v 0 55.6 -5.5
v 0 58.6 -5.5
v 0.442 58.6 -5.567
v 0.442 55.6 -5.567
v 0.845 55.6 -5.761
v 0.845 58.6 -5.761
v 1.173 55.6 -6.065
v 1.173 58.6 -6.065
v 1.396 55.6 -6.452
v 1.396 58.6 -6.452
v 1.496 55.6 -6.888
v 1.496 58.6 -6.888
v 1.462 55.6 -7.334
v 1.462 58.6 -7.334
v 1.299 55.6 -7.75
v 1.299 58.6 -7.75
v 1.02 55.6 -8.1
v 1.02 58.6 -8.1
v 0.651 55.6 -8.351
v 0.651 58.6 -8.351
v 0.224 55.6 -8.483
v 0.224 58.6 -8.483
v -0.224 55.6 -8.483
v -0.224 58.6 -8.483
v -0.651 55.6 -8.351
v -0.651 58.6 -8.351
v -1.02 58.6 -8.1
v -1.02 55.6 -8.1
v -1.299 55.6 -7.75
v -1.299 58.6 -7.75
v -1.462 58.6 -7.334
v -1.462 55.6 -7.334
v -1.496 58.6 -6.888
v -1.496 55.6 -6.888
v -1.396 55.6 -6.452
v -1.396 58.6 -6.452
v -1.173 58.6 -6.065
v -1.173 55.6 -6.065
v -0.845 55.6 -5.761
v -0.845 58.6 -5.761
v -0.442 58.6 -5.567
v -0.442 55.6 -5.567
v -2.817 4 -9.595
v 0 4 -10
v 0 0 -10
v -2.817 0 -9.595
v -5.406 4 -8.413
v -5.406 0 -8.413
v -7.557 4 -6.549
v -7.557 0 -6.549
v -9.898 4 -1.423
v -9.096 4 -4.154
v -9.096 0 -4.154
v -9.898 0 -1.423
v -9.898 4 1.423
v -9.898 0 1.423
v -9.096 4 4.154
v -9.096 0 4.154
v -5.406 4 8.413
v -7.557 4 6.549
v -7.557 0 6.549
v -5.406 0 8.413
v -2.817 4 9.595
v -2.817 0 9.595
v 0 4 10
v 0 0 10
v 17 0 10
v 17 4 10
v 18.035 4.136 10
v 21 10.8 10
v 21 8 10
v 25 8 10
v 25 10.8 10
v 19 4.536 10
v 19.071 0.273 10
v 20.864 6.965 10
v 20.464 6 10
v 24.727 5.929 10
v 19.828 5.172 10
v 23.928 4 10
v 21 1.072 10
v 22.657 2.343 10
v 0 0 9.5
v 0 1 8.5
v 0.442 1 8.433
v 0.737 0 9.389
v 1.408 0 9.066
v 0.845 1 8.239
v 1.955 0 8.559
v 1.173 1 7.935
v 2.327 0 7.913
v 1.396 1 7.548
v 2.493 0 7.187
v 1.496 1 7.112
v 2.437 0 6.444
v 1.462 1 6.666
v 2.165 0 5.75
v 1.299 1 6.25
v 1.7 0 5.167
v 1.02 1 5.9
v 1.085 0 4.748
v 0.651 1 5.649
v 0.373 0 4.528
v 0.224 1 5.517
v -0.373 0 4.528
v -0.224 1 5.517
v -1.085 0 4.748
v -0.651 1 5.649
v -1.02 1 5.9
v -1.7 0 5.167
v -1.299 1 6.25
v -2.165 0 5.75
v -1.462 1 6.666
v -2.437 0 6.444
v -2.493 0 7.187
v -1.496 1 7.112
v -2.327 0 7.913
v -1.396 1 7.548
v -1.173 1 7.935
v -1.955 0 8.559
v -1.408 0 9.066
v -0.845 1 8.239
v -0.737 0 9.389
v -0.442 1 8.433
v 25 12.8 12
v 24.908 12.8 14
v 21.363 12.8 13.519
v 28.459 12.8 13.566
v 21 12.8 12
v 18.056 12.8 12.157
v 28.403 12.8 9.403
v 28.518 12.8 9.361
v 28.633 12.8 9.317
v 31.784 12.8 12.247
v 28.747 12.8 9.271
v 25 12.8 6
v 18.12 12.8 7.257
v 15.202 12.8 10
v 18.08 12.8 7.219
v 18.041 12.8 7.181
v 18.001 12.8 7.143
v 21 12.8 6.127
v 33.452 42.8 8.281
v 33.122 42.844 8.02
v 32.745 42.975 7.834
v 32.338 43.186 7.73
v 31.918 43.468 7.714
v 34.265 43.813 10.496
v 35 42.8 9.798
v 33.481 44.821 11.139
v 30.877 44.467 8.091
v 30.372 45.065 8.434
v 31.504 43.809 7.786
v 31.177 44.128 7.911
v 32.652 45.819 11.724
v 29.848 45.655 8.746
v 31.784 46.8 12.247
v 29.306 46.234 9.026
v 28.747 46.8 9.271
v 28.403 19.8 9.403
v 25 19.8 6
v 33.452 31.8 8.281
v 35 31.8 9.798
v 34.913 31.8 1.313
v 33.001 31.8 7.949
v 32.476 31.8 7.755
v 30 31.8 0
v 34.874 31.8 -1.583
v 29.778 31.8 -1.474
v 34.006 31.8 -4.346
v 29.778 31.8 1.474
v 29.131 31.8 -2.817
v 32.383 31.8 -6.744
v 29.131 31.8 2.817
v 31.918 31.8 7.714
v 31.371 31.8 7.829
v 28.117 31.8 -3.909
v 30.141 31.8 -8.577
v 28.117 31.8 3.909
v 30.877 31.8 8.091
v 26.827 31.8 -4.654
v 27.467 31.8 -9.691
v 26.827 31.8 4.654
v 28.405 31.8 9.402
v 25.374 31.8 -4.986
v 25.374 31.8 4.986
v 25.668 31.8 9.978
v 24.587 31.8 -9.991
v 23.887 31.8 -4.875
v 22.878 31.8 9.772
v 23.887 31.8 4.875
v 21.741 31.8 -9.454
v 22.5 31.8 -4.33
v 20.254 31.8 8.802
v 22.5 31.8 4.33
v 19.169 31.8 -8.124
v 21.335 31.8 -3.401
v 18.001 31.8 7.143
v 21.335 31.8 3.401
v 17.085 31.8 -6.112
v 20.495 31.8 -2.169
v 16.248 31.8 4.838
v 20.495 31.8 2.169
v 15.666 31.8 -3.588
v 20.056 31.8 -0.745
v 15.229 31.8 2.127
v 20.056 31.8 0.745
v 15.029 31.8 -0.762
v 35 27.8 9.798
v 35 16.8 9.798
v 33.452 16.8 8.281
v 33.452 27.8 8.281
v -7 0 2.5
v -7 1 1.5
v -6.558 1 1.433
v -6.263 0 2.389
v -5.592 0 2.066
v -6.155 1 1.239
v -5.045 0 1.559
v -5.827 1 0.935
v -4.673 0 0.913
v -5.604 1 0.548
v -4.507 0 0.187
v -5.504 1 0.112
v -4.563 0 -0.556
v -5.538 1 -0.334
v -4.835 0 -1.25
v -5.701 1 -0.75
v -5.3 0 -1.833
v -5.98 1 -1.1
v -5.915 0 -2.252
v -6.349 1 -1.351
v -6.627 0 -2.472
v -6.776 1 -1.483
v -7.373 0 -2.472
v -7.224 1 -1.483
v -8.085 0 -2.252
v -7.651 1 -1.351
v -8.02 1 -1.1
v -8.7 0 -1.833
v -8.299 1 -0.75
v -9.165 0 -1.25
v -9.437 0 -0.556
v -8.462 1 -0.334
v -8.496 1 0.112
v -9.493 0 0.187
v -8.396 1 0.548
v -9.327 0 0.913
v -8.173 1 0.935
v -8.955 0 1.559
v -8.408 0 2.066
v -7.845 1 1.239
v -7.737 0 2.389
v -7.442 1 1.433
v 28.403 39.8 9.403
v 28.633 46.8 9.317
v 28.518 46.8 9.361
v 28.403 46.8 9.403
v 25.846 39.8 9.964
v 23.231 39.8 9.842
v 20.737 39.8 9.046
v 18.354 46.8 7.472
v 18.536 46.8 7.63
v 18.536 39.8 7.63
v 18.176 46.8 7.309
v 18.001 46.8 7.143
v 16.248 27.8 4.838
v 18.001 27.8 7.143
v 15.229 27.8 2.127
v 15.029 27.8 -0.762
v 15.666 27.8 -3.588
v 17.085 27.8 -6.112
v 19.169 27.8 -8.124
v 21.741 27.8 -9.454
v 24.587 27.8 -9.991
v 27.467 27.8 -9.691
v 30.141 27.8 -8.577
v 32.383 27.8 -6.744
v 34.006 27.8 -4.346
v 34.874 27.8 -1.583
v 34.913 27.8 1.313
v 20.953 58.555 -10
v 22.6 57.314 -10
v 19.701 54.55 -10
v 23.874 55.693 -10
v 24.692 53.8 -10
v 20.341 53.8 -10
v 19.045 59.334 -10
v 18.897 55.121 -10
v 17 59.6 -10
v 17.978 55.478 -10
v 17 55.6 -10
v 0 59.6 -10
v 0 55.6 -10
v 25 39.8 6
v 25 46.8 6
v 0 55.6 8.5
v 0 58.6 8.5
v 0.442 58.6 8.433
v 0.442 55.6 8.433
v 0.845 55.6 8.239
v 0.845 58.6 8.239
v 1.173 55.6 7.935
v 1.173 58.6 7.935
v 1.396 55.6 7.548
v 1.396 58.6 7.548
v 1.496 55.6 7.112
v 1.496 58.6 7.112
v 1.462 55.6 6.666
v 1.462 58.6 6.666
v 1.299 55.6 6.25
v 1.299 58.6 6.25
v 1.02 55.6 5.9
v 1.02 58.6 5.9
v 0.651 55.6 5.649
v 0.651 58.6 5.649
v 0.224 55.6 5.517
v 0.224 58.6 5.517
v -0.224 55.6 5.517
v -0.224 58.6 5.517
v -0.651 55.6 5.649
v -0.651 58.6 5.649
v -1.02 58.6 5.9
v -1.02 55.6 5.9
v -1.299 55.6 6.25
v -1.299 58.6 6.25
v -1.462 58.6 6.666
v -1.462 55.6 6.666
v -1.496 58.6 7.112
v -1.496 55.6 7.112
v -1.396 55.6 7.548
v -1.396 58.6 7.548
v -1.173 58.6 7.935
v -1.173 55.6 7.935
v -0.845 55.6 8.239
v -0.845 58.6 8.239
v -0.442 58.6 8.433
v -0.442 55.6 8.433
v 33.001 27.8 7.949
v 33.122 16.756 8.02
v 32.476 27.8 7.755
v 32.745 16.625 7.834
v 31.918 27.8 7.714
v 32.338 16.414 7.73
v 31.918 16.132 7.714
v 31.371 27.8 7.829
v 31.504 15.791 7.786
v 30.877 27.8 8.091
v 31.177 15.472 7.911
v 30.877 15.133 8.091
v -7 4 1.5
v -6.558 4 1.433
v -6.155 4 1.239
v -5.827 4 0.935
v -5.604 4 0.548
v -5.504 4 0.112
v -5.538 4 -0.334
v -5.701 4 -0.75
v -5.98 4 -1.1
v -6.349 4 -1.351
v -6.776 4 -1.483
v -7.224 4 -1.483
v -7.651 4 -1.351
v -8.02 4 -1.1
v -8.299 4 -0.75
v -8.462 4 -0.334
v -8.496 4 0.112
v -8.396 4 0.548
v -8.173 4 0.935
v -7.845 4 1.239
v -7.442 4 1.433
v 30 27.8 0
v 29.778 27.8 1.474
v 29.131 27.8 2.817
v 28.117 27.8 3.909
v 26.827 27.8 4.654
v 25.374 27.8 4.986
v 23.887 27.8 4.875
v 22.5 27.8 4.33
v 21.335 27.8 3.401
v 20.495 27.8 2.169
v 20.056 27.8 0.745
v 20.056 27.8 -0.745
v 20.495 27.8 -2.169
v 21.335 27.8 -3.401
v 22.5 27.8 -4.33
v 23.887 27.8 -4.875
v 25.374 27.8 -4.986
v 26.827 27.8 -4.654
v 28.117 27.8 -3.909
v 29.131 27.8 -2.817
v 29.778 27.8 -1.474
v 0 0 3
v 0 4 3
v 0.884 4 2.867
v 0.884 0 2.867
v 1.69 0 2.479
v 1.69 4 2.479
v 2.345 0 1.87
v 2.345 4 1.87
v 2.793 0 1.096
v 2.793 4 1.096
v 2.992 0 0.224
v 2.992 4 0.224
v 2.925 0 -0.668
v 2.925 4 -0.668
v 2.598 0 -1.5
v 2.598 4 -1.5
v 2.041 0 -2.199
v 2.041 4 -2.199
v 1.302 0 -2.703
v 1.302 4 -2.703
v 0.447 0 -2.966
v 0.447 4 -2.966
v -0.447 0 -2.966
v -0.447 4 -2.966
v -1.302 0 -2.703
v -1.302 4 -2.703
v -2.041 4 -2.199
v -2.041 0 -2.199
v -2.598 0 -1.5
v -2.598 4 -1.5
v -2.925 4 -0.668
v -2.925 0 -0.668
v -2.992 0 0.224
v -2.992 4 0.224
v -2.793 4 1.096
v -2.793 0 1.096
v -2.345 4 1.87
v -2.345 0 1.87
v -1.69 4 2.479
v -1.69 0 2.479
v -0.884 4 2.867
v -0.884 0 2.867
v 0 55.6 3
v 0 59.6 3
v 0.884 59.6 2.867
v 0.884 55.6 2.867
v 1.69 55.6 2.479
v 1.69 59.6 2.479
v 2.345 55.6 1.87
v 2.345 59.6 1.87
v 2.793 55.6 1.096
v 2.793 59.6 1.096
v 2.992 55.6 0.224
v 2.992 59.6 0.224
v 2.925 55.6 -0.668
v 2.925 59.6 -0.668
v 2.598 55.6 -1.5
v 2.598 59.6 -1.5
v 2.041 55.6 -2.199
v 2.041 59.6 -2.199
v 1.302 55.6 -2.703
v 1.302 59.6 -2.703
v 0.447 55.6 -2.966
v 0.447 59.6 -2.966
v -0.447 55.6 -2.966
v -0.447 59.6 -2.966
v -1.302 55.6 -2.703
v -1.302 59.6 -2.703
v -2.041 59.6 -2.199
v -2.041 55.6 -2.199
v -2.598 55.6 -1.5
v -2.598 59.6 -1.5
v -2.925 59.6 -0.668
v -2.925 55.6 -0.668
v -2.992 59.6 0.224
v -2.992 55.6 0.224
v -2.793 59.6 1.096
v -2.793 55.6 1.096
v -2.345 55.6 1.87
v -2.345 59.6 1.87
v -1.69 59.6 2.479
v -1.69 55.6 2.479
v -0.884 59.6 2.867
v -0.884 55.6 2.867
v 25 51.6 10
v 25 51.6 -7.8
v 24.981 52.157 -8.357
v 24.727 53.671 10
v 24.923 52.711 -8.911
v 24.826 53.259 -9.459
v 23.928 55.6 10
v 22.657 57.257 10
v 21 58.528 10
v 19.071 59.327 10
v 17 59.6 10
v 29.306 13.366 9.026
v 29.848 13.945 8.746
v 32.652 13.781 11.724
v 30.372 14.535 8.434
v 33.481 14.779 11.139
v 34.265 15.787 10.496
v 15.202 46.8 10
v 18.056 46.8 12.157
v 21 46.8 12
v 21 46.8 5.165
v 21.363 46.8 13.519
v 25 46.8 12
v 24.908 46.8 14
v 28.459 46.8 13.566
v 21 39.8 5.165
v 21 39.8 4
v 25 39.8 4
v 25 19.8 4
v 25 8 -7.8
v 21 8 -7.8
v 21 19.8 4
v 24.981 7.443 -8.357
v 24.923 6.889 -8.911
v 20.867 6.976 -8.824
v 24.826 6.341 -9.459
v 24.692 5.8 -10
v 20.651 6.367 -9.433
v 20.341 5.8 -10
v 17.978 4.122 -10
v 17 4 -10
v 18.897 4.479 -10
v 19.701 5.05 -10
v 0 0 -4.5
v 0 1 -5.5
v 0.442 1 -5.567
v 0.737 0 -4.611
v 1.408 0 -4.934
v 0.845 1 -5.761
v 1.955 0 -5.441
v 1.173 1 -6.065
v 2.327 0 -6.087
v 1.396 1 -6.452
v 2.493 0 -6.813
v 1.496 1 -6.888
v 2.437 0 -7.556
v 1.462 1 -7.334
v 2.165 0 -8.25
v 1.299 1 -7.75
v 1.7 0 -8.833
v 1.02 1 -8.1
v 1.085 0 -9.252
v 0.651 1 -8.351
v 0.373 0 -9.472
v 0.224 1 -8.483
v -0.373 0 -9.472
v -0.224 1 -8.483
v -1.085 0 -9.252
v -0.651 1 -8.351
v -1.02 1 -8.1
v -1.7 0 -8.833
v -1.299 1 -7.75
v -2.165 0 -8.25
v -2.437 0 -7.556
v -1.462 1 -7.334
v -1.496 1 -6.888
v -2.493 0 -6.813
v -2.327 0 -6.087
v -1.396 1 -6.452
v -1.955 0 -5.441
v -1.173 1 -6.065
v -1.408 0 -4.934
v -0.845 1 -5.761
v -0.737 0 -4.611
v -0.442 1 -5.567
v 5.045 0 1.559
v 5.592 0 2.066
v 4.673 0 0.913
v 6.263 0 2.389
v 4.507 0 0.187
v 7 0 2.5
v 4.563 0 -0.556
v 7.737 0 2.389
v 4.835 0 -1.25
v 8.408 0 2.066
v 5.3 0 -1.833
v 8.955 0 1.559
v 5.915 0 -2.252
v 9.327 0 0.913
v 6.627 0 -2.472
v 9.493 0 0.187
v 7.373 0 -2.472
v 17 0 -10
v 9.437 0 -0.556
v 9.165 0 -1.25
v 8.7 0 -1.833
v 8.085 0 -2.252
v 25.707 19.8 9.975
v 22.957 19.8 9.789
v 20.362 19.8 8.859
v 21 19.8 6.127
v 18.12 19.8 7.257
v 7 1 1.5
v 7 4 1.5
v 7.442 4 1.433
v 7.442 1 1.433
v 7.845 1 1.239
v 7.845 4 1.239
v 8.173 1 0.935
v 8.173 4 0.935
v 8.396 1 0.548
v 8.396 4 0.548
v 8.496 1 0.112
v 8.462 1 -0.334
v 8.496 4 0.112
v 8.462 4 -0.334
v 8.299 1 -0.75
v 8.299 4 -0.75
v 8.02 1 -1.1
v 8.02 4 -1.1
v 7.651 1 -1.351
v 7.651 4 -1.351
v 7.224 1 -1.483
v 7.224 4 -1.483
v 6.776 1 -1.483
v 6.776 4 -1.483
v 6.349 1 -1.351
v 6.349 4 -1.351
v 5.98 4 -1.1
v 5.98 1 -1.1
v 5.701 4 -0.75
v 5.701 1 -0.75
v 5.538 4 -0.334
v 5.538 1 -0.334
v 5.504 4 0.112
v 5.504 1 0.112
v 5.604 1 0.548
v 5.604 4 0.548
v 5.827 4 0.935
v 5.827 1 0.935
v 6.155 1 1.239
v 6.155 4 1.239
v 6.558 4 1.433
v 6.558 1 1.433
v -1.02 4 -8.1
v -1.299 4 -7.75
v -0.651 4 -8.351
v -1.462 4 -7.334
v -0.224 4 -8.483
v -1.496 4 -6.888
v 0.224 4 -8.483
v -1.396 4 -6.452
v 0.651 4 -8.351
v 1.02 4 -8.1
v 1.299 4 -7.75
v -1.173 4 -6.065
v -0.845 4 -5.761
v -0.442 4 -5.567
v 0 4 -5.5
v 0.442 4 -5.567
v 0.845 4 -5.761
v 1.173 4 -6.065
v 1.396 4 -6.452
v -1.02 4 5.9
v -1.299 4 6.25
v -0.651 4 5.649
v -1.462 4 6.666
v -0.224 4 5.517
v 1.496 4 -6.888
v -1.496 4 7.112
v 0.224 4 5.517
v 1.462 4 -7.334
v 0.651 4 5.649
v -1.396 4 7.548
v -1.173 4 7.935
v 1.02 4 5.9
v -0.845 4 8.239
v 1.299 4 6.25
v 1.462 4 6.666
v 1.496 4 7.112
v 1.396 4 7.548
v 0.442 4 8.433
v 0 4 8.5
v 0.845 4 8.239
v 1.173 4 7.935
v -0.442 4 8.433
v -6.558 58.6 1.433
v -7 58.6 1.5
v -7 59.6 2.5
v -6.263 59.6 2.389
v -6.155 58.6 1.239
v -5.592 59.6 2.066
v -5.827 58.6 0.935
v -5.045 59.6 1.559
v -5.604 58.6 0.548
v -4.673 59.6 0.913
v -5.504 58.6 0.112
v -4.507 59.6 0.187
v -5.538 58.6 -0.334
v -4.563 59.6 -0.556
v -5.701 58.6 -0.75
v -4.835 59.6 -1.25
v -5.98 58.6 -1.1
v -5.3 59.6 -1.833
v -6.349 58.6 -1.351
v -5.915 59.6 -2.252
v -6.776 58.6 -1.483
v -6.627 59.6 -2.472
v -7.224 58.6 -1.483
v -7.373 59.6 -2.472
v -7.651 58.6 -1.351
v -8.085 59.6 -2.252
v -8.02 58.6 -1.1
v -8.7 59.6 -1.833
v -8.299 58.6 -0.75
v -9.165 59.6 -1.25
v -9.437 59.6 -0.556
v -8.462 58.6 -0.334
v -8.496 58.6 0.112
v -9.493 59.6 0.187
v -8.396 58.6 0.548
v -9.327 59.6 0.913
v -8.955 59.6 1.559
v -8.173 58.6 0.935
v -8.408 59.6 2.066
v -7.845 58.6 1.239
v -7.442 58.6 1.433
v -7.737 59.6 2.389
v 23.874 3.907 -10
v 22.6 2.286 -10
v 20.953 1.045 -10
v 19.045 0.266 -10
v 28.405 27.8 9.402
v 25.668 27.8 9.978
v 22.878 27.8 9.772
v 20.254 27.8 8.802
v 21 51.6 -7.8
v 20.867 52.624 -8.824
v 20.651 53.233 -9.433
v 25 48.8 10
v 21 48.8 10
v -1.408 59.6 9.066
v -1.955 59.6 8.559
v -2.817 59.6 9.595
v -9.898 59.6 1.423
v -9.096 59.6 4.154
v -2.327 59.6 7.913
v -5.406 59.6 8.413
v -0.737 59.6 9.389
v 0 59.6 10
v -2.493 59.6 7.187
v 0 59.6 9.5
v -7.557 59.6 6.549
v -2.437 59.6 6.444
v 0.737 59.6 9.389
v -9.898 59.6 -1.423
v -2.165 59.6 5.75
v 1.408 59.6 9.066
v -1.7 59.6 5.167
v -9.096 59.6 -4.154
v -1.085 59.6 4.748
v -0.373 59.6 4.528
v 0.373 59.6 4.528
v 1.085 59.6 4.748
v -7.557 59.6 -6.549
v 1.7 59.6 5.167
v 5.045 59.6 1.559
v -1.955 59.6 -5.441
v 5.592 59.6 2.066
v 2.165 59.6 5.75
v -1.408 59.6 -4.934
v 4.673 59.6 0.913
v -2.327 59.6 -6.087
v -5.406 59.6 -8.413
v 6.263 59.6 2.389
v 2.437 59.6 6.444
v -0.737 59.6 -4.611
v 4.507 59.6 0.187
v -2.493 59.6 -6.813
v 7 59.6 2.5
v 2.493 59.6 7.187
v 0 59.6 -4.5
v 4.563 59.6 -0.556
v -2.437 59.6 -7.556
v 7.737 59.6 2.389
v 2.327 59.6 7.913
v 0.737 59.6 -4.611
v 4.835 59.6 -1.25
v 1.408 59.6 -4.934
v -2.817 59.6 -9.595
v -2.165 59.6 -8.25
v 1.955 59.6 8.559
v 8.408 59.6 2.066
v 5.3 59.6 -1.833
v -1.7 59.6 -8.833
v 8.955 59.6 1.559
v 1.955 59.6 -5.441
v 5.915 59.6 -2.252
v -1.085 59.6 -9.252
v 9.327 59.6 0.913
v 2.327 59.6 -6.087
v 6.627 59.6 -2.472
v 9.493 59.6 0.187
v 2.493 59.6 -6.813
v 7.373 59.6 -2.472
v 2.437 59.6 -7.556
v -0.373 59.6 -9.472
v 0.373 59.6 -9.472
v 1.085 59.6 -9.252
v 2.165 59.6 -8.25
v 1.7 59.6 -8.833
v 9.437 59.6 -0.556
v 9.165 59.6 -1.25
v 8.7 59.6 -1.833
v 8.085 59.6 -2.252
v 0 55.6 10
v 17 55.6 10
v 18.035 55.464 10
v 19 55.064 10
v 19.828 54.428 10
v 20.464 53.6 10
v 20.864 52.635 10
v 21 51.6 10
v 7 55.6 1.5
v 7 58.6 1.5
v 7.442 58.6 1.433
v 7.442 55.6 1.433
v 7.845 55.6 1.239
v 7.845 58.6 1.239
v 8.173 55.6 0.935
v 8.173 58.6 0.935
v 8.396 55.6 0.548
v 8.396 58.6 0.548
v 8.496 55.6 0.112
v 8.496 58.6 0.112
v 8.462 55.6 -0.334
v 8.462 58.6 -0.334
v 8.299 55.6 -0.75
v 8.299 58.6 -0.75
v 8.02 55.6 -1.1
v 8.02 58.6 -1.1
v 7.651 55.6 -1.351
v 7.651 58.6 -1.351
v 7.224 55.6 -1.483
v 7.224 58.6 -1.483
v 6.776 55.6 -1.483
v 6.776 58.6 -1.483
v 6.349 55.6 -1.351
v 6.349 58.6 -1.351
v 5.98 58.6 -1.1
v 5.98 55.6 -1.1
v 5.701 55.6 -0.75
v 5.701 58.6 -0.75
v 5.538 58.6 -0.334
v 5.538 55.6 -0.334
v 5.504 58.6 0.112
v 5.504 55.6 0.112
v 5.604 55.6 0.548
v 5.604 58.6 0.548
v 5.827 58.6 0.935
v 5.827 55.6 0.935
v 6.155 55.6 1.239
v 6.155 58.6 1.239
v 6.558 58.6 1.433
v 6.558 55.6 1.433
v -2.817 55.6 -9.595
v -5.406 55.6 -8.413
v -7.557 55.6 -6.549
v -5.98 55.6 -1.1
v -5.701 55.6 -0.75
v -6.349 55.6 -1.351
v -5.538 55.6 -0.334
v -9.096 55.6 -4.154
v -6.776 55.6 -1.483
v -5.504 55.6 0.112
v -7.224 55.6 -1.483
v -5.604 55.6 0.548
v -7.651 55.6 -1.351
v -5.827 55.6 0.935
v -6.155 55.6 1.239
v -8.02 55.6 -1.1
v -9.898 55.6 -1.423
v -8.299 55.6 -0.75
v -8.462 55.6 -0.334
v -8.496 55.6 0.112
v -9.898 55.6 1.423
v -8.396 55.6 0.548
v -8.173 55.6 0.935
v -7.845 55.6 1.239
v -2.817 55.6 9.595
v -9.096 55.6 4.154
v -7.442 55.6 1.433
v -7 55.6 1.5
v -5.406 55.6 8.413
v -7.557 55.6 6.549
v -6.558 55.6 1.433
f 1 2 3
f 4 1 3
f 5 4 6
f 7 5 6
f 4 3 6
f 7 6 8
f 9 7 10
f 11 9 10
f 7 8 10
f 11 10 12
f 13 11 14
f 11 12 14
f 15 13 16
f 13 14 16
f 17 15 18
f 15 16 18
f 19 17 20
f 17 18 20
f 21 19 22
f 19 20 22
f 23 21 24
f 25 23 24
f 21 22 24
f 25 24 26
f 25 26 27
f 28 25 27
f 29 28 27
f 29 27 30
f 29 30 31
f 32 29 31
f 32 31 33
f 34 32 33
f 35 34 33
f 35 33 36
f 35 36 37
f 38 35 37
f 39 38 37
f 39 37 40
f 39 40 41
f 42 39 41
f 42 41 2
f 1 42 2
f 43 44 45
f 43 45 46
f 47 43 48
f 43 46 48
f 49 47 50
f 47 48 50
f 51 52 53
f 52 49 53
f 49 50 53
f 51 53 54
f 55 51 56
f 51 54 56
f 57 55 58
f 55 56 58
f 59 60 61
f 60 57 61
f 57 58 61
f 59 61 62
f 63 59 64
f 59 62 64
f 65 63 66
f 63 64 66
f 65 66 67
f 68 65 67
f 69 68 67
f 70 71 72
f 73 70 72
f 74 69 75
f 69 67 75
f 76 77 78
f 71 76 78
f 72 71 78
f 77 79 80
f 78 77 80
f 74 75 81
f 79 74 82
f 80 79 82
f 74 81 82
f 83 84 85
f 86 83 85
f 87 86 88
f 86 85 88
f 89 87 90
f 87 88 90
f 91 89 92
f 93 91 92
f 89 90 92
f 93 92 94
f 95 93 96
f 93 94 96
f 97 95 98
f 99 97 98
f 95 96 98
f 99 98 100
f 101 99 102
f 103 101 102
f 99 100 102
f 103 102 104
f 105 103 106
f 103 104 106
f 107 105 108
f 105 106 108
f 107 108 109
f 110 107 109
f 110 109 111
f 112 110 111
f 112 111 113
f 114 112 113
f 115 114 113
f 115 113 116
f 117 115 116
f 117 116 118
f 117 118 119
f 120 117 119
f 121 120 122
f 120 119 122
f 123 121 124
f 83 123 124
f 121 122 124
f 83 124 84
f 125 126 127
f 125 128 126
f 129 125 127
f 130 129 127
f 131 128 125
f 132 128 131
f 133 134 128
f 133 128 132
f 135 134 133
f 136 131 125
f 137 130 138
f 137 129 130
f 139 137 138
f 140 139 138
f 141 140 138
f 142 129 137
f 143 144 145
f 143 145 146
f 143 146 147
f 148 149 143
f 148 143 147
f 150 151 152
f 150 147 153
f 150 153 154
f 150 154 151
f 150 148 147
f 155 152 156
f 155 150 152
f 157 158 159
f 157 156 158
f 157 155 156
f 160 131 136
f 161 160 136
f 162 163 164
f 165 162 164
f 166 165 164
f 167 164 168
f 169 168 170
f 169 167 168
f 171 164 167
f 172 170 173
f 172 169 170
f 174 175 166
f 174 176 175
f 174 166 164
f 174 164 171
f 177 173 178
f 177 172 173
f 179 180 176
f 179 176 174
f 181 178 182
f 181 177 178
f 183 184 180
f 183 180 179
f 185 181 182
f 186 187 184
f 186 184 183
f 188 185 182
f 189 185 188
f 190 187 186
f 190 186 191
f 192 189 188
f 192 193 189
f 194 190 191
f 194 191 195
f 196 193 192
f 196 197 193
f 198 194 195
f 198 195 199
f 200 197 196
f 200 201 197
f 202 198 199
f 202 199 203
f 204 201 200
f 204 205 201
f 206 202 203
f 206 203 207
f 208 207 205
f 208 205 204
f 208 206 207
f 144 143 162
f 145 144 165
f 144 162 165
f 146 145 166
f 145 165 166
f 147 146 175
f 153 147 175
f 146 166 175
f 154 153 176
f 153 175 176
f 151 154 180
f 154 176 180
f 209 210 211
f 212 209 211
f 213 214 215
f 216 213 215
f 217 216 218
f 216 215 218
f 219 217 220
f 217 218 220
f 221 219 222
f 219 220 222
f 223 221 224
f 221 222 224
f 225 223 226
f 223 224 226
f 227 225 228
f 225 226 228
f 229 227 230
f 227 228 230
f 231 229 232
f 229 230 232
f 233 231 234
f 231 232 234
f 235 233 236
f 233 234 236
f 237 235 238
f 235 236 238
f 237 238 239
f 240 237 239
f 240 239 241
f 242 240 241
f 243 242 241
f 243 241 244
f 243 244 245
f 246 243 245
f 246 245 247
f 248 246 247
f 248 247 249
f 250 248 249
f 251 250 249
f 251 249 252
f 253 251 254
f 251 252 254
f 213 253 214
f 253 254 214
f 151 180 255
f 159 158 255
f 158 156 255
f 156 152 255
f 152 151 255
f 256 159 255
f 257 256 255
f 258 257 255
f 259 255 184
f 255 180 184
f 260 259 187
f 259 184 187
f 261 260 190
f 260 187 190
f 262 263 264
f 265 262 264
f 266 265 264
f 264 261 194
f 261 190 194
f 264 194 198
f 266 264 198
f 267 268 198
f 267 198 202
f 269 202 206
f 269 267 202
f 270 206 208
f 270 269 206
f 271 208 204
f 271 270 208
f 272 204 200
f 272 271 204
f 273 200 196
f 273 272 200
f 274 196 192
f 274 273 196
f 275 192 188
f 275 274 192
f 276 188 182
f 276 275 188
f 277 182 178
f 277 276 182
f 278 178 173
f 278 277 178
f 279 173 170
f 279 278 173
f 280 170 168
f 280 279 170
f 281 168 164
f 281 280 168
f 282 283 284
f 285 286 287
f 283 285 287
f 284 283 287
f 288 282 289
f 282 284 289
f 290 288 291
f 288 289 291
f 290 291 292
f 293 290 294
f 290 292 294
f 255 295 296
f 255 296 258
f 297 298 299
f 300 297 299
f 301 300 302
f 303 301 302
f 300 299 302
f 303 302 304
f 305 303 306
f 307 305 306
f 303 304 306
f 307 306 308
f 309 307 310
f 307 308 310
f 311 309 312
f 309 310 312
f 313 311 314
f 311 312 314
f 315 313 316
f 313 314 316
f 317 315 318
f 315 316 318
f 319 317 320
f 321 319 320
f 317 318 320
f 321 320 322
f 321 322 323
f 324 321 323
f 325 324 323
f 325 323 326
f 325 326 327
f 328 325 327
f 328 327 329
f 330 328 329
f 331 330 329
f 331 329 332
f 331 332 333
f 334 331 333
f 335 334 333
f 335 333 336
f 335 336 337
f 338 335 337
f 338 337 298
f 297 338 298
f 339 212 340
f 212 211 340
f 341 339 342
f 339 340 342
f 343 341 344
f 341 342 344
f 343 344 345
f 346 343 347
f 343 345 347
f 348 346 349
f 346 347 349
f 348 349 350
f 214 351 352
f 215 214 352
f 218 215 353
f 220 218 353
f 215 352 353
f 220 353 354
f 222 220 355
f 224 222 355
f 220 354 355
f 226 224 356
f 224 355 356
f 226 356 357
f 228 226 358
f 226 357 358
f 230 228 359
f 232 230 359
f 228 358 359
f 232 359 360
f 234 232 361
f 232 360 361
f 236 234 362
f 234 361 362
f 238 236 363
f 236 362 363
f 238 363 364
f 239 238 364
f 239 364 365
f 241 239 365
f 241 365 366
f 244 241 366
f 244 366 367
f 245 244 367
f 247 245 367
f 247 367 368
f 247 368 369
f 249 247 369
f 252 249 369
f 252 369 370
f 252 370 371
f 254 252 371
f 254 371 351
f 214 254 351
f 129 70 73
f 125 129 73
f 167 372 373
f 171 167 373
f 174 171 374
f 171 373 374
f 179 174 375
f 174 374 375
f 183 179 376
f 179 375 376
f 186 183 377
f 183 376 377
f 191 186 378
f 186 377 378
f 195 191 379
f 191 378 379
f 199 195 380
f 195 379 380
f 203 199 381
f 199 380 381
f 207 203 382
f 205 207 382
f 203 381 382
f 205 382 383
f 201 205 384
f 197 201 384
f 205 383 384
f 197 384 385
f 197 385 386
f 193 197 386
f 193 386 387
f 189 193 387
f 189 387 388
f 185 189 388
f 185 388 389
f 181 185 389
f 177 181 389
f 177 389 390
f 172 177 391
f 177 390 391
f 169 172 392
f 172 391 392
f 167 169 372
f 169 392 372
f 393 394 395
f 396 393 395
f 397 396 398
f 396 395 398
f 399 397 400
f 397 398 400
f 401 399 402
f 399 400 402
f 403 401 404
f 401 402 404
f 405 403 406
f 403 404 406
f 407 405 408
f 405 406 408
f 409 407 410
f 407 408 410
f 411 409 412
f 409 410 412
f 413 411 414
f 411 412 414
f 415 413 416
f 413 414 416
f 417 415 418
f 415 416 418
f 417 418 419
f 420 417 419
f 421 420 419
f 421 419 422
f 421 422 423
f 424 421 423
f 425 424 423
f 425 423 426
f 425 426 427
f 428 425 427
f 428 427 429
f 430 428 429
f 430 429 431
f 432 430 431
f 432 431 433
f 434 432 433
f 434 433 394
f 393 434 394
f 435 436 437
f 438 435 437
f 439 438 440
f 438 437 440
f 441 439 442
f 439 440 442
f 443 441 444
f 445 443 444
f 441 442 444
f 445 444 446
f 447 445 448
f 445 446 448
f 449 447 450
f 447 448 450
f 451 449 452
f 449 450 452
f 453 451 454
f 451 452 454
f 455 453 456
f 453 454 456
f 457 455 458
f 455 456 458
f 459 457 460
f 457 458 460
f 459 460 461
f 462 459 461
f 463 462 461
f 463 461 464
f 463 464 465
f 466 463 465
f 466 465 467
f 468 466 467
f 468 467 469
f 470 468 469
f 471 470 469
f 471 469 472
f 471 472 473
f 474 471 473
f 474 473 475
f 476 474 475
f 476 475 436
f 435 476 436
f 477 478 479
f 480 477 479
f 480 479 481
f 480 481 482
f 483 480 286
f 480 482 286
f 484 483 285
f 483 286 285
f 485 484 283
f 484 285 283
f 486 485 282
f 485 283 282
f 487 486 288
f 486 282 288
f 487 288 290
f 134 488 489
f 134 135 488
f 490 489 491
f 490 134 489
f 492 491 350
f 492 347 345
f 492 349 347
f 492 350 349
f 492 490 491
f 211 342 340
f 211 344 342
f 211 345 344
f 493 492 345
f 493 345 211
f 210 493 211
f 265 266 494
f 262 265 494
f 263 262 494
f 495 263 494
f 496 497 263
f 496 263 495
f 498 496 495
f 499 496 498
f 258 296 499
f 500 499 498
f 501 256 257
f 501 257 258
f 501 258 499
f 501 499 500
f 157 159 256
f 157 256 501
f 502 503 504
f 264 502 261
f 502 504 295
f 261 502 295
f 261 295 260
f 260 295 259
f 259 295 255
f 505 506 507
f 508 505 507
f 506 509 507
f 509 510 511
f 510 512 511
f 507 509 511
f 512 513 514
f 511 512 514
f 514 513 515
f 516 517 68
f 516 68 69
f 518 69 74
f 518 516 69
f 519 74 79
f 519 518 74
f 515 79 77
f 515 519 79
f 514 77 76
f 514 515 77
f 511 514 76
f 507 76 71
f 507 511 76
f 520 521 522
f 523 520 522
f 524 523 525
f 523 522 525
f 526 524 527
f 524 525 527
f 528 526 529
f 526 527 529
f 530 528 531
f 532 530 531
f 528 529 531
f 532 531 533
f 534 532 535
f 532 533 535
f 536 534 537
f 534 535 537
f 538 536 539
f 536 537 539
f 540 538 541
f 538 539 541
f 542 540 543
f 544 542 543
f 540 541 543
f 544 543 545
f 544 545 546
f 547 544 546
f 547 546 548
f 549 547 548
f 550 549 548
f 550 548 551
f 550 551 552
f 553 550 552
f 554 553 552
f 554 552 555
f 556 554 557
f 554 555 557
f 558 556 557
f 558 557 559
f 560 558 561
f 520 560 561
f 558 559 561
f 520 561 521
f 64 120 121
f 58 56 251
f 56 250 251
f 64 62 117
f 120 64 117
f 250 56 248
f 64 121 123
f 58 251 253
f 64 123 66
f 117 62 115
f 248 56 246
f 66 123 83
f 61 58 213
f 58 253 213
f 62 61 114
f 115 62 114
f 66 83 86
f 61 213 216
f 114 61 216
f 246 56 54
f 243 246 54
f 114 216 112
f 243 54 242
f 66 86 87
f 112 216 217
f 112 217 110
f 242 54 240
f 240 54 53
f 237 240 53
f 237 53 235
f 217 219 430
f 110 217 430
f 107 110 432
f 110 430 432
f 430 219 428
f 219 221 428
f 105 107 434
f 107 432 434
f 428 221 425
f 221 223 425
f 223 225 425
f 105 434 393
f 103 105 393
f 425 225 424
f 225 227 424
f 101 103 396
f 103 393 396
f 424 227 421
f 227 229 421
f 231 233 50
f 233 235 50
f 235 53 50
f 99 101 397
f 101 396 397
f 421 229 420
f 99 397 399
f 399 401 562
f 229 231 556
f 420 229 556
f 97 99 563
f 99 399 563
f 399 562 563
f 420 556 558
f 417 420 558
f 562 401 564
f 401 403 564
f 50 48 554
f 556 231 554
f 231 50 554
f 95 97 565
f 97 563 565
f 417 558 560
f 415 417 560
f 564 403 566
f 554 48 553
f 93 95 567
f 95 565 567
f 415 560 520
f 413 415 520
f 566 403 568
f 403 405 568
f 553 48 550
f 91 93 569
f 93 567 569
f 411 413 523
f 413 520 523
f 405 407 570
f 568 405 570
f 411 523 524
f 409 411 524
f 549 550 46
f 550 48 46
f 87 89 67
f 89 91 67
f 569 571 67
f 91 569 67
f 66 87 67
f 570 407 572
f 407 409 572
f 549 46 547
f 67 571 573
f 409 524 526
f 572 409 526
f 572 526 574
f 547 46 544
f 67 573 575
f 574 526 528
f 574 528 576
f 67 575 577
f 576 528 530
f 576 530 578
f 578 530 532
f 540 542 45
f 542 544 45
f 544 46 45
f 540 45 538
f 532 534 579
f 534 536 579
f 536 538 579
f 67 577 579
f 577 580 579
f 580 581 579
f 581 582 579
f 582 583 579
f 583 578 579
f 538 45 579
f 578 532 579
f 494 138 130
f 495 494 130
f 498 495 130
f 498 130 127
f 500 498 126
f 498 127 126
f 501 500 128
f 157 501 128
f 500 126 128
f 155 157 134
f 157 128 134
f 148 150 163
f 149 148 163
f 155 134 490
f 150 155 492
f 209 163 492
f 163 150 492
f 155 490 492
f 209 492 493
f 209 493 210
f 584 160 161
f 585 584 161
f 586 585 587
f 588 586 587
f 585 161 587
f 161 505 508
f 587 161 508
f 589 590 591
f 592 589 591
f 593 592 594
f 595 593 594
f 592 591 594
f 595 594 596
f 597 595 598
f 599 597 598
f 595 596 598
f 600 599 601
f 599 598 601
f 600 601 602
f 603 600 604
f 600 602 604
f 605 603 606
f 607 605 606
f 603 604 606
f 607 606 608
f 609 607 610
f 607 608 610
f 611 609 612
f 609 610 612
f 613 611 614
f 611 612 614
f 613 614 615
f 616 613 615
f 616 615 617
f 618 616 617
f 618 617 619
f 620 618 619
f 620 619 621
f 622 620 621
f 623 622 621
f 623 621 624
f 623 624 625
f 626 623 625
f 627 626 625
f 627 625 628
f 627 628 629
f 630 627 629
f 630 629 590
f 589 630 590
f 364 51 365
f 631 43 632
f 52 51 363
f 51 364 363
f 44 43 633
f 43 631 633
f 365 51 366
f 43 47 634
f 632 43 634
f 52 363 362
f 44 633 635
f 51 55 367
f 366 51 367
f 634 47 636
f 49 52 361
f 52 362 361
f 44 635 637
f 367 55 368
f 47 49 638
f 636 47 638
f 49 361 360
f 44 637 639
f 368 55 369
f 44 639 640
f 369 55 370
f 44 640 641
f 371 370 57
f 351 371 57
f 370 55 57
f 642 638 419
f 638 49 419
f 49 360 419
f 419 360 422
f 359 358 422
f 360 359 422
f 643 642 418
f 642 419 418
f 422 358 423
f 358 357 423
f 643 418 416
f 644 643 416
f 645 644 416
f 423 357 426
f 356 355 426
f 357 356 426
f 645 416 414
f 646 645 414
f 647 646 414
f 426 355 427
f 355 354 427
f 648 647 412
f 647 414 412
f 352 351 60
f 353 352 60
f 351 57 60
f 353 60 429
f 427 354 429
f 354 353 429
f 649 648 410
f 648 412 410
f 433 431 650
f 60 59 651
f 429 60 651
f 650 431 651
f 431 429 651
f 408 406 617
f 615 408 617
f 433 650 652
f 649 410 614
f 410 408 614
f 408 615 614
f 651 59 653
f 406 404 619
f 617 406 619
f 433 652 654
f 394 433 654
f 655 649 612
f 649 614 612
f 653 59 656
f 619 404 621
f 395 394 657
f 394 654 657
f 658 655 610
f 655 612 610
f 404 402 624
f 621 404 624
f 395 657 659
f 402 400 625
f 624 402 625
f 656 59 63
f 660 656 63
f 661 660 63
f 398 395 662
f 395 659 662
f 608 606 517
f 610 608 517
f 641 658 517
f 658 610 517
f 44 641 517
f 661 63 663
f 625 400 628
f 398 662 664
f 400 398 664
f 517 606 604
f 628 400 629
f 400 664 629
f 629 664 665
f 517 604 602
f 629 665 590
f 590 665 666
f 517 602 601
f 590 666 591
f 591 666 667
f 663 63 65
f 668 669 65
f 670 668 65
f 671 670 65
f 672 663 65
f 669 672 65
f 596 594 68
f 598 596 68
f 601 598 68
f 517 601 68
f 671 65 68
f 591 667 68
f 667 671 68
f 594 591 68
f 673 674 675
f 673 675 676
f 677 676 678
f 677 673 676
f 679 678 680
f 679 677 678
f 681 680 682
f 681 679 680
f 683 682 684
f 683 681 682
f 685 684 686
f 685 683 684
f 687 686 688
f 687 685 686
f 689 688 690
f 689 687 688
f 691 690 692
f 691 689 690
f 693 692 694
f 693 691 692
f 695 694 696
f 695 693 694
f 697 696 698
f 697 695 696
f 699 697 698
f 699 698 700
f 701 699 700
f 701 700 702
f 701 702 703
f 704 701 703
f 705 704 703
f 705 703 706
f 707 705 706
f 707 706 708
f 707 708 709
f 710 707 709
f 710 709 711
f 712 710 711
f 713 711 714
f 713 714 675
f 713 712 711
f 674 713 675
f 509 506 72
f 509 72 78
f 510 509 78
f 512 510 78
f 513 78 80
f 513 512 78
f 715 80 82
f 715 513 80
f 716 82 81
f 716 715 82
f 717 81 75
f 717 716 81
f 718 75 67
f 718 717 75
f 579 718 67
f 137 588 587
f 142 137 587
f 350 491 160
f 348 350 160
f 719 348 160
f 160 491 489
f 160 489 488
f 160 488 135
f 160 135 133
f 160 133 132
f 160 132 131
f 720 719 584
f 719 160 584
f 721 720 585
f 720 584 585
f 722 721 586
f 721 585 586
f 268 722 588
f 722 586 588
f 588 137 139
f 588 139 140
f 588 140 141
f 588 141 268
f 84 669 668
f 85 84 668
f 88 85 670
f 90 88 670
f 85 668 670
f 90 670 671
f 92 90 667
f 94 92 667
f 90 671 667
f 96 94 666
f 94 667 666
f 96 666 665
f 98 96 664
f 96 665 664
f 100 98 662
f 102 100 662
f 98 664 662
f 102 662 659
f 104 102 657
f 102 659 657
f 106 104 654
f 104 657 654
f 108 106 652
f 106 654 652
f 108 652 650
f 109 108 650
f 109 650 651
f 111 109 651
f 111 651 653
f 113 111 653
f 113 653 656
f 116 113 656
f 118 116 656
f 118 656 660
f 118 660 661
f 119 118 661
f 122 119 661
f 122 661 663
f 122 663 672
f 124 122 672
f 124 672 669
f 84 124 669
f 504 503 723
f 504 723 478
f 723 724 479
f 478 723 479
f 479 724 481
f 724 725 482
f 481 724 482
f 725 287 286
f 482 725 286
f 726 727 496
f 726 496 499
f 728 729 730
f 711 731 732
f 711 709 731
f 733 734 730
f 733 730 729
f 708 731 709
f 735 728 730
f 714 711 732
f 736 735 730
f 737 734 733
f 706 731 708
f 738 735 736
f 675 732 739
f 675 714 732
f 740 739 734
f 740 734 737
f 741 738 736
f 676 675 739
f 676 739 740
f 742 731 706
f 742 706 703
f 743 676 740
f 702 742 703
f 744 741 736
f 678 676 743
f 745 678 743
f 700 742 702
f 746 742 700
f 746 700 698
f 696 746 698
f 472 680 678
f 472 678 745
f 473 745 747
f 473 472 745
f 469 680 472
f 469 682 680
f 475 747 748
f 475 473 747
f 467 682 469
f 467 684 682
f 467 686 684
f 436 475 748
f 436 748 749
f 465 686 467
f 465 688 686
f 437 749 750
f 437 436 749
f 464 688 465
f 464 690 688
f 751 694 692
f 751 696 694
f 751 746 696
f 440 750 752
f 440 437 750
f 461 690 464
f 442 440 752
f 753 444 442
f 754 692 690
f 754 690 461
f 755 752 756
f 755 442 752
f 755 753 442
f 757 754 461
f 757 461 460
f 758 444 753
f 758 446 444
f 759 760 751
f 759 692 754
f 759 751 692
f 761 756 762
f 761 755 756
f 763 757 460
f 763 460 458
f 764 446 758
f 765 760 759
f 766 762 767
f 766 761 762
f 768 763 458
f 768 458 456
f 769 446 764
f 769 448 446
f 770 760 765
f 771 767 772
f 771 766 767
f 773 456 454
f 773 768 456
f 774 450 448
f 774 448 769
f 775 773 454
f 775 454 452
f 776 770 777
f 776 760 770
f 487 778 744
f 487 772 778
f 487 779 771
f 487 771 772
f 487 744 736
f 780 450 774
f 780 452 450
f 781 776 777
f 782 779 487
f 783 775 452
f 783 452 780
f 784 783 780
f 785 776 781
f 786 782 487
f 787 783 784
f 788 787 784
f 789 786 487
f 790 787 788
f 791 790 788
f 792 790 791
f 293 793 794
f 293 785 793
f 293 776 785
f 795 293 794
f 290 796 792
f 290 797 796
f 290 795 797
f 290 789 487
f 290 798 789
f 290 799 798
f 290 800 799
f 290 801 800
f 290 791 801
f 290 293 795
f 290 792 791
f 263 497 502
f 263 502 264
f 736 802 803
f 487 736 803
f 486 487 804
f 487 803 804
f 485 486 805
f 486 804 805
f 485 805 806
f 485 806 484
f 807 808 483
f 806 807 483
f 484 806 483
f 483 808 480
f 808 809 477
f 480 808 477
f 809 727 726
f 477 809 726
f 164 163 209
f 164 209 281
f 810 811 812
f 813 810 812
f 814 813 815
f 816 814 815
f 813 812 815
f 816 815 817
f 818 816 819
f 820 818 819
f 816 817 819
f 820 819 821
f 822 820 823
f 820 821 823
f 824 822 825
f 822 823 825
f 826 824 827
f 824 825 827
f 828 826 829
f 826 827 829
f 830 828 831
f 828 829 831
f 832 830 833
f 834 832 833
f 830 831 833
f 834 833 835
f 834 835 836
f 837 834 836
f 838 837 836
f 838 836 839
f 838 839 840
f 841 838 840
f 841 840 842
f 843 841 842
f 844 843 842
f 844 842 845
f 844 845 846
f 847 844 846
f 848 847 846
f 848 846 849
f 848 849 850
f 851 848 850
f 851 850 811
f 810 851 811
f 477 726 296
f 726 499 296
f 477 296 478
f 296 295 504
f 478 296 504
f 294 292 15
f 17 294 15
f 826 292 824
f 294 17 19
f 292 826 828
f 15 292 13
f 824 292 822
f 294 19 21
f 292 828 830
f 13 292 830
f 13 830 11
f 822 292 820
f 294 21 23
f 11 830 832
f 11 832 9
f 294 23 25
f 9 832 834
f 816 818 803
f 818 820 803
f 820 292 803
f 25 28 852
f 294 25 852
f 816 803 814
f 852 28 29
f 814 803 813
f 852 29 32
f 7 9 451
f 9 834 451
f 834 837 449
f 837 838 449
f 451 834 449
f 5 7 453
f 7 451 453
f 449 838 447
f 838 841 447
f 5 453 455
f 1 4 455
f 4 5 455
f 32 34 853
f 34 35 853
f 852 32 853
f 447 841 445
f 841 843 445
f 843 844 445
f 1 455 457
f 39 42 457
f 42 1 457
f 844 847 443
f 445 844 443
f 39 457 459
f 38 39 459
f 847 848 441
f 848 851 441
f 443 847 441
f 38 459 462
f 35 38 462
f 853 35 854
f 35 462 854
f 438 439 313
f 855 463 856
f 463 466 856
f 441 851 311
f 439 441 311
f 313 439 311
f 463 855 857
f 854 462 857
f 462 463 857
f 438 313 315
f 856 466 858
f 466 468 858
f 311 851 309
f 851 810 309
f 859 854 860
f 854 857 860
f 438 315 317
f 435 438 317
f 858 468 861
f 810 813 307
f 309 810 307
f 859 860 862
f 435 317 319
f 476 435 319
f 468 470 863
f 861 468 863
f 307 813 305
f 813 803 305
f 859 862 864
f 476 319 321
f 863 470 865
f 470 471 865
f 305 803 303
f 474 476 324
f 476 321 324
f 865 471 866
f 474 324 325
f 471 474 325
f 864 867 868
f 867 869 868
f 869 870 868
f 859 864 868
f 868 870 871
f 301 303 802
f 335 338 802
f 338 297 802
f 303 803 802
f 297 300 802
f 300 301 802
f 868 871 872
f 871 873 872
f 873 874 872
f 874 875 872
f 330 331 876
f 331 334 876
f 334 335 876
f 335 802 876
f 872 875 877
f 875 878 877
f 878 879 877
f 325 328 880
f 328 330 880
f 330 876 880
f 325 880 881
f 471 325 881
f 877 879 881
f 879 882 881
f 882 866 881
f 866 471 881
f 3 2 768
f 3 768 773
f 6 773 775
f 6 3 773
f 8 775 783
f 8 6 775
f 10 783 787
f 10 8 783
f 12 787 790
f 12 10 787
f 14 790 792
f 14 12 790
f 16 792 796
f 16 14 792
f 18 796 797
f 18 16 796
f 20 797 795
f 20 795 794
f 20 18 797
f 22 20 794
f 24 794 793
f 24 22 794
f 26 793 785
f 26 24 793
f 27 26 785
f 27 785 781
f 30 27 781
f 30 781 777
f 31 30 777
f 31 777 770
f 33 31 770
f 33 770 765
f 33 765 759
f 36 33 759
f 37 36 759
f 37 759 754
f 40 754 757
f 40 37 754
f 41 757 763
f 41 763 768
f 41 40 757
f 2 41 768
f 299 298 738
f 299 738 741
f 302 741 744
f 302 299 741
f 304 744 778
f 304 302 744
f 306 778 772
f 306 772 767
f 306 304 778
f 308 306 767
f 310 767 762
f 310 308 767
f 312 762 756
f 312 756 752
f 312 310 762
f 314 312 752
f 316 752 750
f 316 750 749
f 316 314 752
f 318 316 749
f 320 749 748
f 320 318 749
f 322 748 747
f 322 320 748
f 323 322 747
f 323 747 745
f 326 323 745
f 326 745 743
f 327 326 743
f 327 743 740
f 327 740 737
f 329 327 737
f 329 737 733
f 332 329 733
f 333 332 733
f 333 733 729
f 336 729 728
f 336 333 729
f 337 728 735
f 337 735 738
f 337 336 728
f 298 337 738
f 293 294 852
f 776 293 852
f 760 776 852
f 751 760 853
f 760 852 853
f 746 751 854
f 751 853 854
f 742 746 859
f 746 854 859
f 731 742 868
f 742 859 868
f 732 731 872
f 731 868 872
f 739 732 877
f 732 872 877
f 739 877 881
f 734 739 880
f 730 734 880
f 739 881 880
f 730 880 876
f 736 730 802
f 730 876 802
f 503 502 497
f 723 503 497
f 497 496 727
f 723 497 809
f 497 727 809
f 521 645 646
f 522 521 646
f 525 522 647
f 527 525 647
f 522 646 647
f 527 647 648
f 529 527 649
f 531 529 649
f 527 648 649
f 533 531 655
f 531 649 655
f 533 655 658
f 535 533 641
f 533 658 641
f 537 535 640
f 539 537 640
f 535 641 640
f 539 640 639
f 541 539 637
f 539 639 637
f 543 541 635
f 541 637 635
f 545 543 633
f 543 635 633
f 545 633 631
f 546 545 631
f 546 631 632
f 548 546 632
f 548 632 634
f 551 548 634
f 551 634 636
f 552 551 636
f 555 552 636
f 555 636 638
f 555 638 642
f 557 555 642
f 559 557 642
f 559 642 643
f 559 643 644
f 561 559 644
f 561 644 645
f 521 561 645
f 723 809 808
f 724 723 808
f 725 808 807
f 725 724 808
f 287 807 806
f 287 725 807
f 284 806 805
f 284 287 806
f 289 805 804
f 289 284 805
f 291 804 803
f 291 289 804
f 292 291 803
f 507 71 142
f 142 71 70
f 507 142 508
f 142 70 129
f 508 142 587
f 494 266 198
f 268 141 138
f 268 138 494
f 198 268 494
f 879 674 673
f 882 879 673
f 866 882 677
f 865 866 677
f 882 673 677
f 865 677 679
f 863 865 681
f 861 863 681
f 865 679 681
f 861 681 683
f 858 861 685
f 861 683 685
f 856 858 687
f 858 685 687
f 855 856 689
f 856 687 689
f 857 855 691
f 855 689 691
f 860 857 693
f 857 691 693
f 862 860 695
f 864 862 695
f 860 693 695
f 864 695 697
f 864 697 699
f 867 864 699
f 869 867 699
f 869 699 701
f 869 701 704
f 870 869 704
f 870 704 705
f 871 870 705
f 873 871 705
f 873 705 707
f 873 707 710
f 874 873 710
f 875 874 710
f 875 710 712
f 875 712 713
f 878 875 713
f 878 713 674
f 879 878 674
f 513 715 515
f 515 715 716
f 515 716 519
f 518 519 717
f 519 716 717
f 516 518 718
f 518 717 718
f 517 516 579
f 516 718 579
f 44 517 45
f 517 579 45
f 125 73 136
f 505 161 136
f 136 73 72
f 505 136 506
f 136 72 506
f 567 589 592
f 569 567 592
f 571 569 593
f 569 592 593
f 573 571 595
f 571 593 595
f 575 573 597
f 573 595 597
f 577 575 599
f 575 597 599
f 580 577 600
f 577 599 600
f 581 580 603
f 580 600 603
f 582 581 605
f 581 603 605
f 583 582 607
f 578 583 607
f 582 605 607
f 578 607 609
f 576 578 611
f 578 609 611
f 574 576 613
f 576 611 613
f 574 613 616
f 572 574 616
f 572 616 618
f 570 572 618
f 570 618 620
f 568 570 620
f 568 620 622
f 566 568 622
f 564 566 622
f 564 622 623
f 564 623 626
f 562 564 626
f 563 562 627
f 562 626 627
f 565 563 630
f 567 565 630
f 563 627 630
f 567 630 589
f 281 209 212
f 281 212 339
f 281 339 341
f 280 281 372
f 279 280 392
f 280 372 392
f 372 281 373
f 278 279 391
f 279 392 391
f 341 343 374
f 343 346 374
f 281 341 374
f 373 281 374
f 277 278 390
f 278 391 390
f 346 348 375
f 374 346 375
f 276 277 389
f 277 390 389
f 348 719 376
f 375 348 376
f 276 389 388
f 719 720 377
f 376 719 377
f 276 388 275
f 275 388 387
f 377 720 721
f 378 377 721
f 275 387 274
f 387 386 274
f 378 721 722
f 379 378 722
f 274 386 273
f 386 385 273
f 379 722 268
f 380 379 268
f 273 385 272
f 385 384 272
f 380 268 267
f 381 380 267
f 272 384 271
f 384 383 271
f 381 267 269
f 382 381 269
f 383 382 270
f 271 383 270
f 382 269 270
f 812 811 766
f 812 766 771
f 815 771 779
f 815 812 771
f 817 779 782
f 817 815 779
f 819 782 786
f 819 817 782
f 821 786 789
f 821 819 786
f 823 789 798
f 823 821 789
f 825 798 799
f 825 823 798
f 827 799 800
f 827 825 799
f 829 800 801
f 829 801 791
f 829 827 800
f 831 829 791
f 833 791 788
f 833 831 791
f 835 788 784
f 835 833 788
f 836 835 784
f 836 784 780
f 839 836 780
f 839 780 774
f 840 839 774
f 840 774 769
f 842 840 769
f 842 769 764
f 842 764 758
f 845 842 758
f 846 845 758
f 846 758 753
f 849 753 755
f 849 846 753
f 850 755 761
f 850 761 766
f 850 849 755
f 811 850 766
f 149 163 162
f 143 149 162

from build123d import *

# Parameters (mm, degrees)
BOSS_EXTRUDE1_DEPTH = 59.6
CUT_EXTRUDE1_DEPTH  = 59.6
SKETCH3_R           = 1.5000000000000004
SKETCH3_R_2         = 1.5000000000000007
SKETCH3_R_3         = 1.5000000000000009
SKETCH3_R_4         = 1.5000000000000002
CUT_EXTRUDE2_DEPTH  = 66.4
CHAMFER1_SIZE       = 1
SKETCH4_R           = 3
CUT_EXTRUDE3_DEPTH  = 66.4
FILLET1_R           = 4
CUT_EXTRUDE4_DEPTH  = 59.6
SKETCH5_R           = 10
BOSS_EXTRUDE2_DEPTH = 2
BOSS_EXTRUDE3_DEPTH = 17
CHAMFER2_SIZE       = 4
CHAMFER2_SIZE_2     = 3.038324347
CHAMFER3_SIZE       = 4
FILLET3_R           = 2
CHAMFER4_SIZE       = 14
CHAMFER5_SIZE       = 2
FILLET4_R           = 8
SKETCH11_R          = 5.000000000000001
CUT_EXTRUDE5_DEPTH  = 4


with BuildPart() as part:
    # Sketch1 → Boss-Extrude1 (new body)
    with BuildSketch(Plane(origin=(0, 0, 0), x_dir=(1, 0, 0), z_dir=(0, 1, 0))):
        with BuildLine():
            ThreePointArc((6.1e-16, 9.999999999999998), (-9.999999999999998, 1.22e-15), (-1.84e-15, -9.999999999999998))
            Line((0, -9.999999999999998), (0, 10.000000000000002))
        make_face()
        with BuildLine():
            Line((0, 10.000000000000002), (0, -9.999999999999998))
            ThreePointArc((-1.84e-15, -9.999999999999998), (7.071067811865472, -7.0710678118654755), (9.999999999999998, -2.45e-15))
            ThreePointArc((9.999999999999998, 0), (7.071067811865475, 7.071067811865474), (6.1e-16, 9.999999999999998))
        make_face()
        with BuildLine():
            ThreePointArc((9.999999999999998, -2.45e-15), (7.071067811865472, -7.0710678118654755), (-1.84e-15, -9.999999999999998))
            Line((0, -9.999999999999998), (25, -9.999999999999998))
            Line((25, -9.999999999999998), (25, 10.000000000000002))
            Line((25, 10), (0, 10.000000000000002))
            ThreePointArc((6.1e-16, 9.999999999999998), (7.071067811865475, 7.071067811865474), (9.999999999999998, 0))
        make_face()
    extrude(amount=BOSS_EXTRUDE1_DEPTH)

    # Sketch2 → Cut-Extrude1 (cut)
    with BuildSketch(Plane.XY.offset(9.999999999999998)):
        Polygon((-9.999999999999998, 4.0000000000000036), (21, 4), (21, 55.599999999999994), (-9.999999999999998, 55.599999999999994), align=None)
    extrude(amount=-CUT_EXTRUDE1_DEPTH, mode=Mode.SUBTRACT)

    # Sketch3 → Cut-Extrude2 (cut, through all)
    with BuildSketch(Plane(origin=(0, 59.6, 0), x_dir=(1, 0, 0), z_dir=(0, 1, 0))):
        with Locations(Location((-7, 0, 0), (0, 0, 270))):
            Circle(SKETCH3_R)
        with Locations(Location((2.444e-14, 7, 0), (0, 0, 270))):
            Circle(SKETCH3_R_2)
        with Locations(Location((7, -4.888e-14, 0), (0, 0, 270))):
            Circle(SKETCH3_R_3)
        with Locations(Location((-7.332e-14, -7.000000000000001, 0), (0, 0, 270))):
            Circle(SKETCH3_R_4)
    extrude(amount=-CUT_EXTRUDE2_DEPTH, mode=Mode.SUBTRACT)

    # Chamfer1
    chamfer1_edges = [part.edges().sort_by_distance(p)[0] for p in [
        (-7, 0, -1.5000000000000004),
        (-7, 59.6, -1.5000000000000004),
        (2.49e-14, 0, -8.5),
        (2.49e-14, 59.6, -8.5),
        (7.000000000000001, 0, -1.499999999999952),
        (7.000000000000001, 59.6, -1.499999999999952),
        (-7.286e-14, 0, 5.500000000000001),
        (-7.286e-14, 59.6, 5.500000000000001),
    ]]
    chamfer(chamfer1_edges, length=CHAMFER1_SIZE)

    # Sketch4 → Cut-Extrude3 (cut, through all)
    with BuildSketch(Plane(origin=(0, 59.6, 0), x_dir=(1, 0, 0), z_dir=(0, 1, 0))):
        with Locations(Location((0, 0, 0), (0, 0, 270))):
            Circle(SKETCH4_R)
    extrude(amount=-CUT_EXTRUDE3_DEPTH, mode=Mode.SUBTRACT)

    # Fillet1
    fillet1_edges = [part.edges().sort_by_distance(p)[0] for p in [
        (21, 4, -1.78e-15),
        (21, 55.599999999999994, -1.78e-15),
    ]]
    fillet(fillet1_edges, radius=FILLET1_R)

    # Sketch6 → Cut-Extrude4 (cut)
    with BuildSketch(Plane(origin=(25, 0, 0), x_dir=(0, 0, -1), z_dir=(1, 0, 0))):
        Polygon((30, 19.799999999999997), (-10, 19.799999999999983), (-9.999999999999998, 39.800000000000004), (30, 39.800000000000004), align=None)
    extrude(amount=-CUT_EXTRUDE4_DEPTH, mode=Mode.SUBTRACT)


with BuildPart() as cut_extrude4_piece_1:
    # of the separate pieces the step leaves, piece 1, a body of its own (cut_extrude4_pieces)
    add(part.part.solids().sort_by_distance((21, 39.8, -10))[0])



with BuildPart() as cut_extrude4_piece_2:
    # of the separate pieces the step leaves, piece 2, a body of its own (cut_extrude4_pieces)
    add(part.part.solids().sort_by_distance((17, 4, -10))[0])


with BuildPart() as body_3:
    # Sketch5 → Boss-Extrude2 (new, symmetric)
    with BuildSketch(Plane(origin=(1.67e-15, 29.8, 0), x_dir=(-1, 6e-17, 0), z_dir=(-6e-17, -1, 0))):
        with Locations(Location((-25, 0, 0), (0, 0, 180))):
            Circle(SKETCH5_R)
    extrude(amount=BOSS_EXTRUDE2_DEPTH, both=True)


with BuildPart() as cut_extrude4_piece_1_1:
    add(cut_extrude4_piece_1.part)

    add(cut_extrude4_piece_2.part)  # Boss-Extrude3 merges Cut-Extrude4 piece 2

    add(body_3.part)  # Boss-Extrude3 merges body 3
    # Sketch8 → Boss-Extrude3 (add, symmetric)
    with BuildSketch(Plane(origin=(1.67e-15, 29.8, 0), x_dir=(-1, 6e-17, 0), z_dir=(-6e-17, -1, 0))):
        with BuildLine():
            Line((-18.00145787776235, -7.1428571428571415), (-15.202041028867285, -9.999999999999998))
            ThreePointArc((-15.202041028867285, -9.999999999999998), (-25.14286458158996, -13.999271042140986), (-35, -9.797958971132715))
            Line((-35, -9.797958971132715), (-32.142857142857146, -6.998542122237653))
            ThreePointArc((-32.142857142857146, -6.998542122237653), (-25.10204612970712, -9.999479315814993), (-18.00145787776235, -7.1428571428571415))
        make_face()
    extrude(amount=BOSS_EXTRUDE3_DEPTH, both=True)

    # Chamfer2
    # the kernel refuses this chamfer: 4, 3.038324347 mm, written as the material it adds along each edge
    with BuildSketch(Plane(origin=(25, 39.800000000000004, 9.999999999999998), x_dir=(0, 0, -1), z_dir=(0, 1, 0))) as chamfer2_piece_1:
        with BuildLine():
            Line((CHAMFER2_SIZE, 0), (0.5968757625671461, -3.403124237432852))
            ThreePointArc((0.5968757625671461, -3.403124237432852), (0.15846004750250664, -1.7731585838259747), (0, 0))
            Line((0, 0), (CHAMFER2_SIZE, 0))
        make_face()
    extrude(amount=6.999999999999993)
    with BuildSketch(Plane(origin=(25, 12.799999999999999, 9.999999999999998), x_dir=(0.9849650815494138, 0, -0.17275354736837392), z_dir=(0, 1, 0))) as chamfer2_piece_2:
        with BuildLine():
            Line((3.4550709473675134, 2e-17), (CHAMFER2_SIZE * 0.172753547368, CHAMFER2_SIZE * 0.984965081549))
            Line((CHAMFER2_SIZE * 0.172753547368, CHAMFER2_SIZE * 0.984965081549), (0, 0))
            ThreePointArc((0, 0), (1.773873824440413, -0.15024182179198892), (3.4550709473675134, 2e-17))
        make_face()
    extrude(amount=6.999999999999984)
    with BuildSketch(Plane(origin=(21, 46.8, 9.165151389911681), x_dir=(0, 0, -1), z_dir=(-6e-17, -1, 0))) as chamfer2_piece_3:
        with BuildLine():
            Line((CHAMFER2_SIZE, 0), (1.5355475582413494, -2.464452441758805))
            ThreePointArc((1.5355475582413494, -2.464452441758805), (0.6874579868810571, -1.3036510598088036), (0, 0))
            Line((0, 0), (CHAMFER2_SIZE, 0))
        make_face()
    extrude(amount=6.999999999999993)
    with BuildSketch(Plane(origin=(21, 19.799999999999983, 9.165151389911681), x_dir=(-0.8336339896703572, 0, -0.5523172740973098), z_dir=(-6e-17, -1, 0))) as chamfer2_piece_4:
        with BuildLine():
            Line((3.4550709473675125, 1.3e-16), (CHAMFER2_SIZE_2 * 0.552317274099, CHAMFER2_SIZE_2 * 0.833633989672))
            Line((CHAMFER2_SIZE_2 * 0.552317274099, CHAMFER2_SIZE_2 * 0.833633989672), (0, 0))
            ThreePointArc((0, 0), (1.7738738244404142, -0.1502418217919865), (3.4550709473675125, 1.3e-16))
        make_face()
    extrude(amount=6.999999999999982)
    # the kernel refuses this chamfer: 4, 3.038324347 mm, written as the material it takes off along each edge
    with BuildSketch(Plane(origin=(42.3476656799026, 46.8, 16.997171657661287), x_dir=(4.2e-16, -1, -4.8e-16), z_dir=(-0.7142857142857139, 0, -0.6998542122237658))) as chamfer2_2_piece_1_section:
        Polygon((CHAMFER2_SIZE, 0), (-2.54e-15, CHAMFER2_SIZE), (0, 0), align=None)
    chamfer2_2_piece_1 = extrude(amount=24.573463903727287, mode=Mode.PRIVATE)
    chamfer2_2_piece_1 = split(chamfer2_2_piece_1, bisect_by=Plane(origin=(25, 46.8, 16.997171657661287), z_dir=(1, 0, 0)), keep=Keep.TOP, mode=Mode.PRIVATE)
    add(chamfer2_2_piece_1, mode=Mode.SUBTRACT)
    with BuildSketch(Plane(origin=(42.3476656799026, 12.799999999999999, 16.997171657661287), x_dir=(-0.6998542122237658, 0, 0.7142857142857139), z_dir=(-0.7142857142857139, 0, -0.6998542122237658))) as chamfer2_2_piece_2_section:
        Polygon((CHAMFER2_SIZE, 0), (-2.54e-15, CHAMFER2_SIZE), (0, 0), align=None)
    chamfer2_2_piece_2 = extrude(amount=24.57346390372729, mode=Mode.PRIVATE)
    chamfer2_2_piece_2 = split(chamfer2_2_piece_2, bisect_by=Plane(origin=(25, 12.799999999999999, 16.997171657661287), z_dir=(1, 0, 0)), keep=Keep.TOP, mode=Mode.PRIVATE)
    add(chamfer2_2_piece_2, mode=Mode.SUBTRACT)

    # Chamfer3
    # the kernel refuses this chamfer: 4 mm, written as the material it adds along each edge
    with BuildSketch(Plane(origin=(32.142857142857146, 31.8, 6.998542122237653), x_dir=(0.7142857142857139, 0, 0.6998542122237658), z_dir=(0, -1, 0))) as chamfer3_piece_1:
        with BuildLine():
            Line((CHAMFER3_SIZE, -9e-17), (-2.0000000000000133, -6.0000000000000115))
            ThreePointArc((-2.0000000000000133, -6.0000000000000115), (-0.5373798977418118, -3.234010018589798), (0, 0))
            Line((0, 0), (CHAMFER3_SIZE, -9e-17))
        make_face()
    extrude(amount=4)

    # Fillet3
    fillet3_edges = [cut_extrude4_piece_1_1.edges().sort_by_distance(p)[0] for p in [
        (32.142857142857146, 37.3, 6.998542122237653),
        (32.142857142857146, 22.3, 6.998542122237653),
    ]]
    fillet(fillet3_edges, radius=FILLET3_R)

    # Chamfer4
    chamfer4_edges = [cut_extrude4_piece_1_1.edges().sort_by_distance(p)[0] for p in [
        (23, 39.800000000000004, -10),
        (23, 19.79999999999999, -10),
    ]]
    chamfer(chamfer4_edges, length=CHAMFER4_SIZE)

    # Chamfer5
    chamfer5_edges = [cut_extrude4_piece_1_1.edges().sort_by_distance(p)[0] for p in [
        (23, 46.8, 9.999999999999998),
        (23, 12.8, 9.999999999999998),
    ]]
    chamfer(chamfer5_edges, length=CHAMFER5_SIZE)

    # Fillet4
    fillet4_edges = [cut_extrude4_piece_1_1.edges().sort_by_distance(p)[0] for p in [
        (25, 0, -1.78e-15),
        (25, 59.6, -1.78e-15),
    ]]
    fillet(fillet4_edges, radius=FILLET4_R)

    # Sketch11 → Cut-Extrude5 (cut)
    with BuildSketch(Plane.XZ.offset(-27.8)):
        with Locations((25, 0)):
            Circle(SKETCH11_R)
    extrude(amount=-CUT_EXTRUDE5_DEPTH, mode=Mode.SUBTRACT)


solid = cut_extrude4_piece_1_1.part
